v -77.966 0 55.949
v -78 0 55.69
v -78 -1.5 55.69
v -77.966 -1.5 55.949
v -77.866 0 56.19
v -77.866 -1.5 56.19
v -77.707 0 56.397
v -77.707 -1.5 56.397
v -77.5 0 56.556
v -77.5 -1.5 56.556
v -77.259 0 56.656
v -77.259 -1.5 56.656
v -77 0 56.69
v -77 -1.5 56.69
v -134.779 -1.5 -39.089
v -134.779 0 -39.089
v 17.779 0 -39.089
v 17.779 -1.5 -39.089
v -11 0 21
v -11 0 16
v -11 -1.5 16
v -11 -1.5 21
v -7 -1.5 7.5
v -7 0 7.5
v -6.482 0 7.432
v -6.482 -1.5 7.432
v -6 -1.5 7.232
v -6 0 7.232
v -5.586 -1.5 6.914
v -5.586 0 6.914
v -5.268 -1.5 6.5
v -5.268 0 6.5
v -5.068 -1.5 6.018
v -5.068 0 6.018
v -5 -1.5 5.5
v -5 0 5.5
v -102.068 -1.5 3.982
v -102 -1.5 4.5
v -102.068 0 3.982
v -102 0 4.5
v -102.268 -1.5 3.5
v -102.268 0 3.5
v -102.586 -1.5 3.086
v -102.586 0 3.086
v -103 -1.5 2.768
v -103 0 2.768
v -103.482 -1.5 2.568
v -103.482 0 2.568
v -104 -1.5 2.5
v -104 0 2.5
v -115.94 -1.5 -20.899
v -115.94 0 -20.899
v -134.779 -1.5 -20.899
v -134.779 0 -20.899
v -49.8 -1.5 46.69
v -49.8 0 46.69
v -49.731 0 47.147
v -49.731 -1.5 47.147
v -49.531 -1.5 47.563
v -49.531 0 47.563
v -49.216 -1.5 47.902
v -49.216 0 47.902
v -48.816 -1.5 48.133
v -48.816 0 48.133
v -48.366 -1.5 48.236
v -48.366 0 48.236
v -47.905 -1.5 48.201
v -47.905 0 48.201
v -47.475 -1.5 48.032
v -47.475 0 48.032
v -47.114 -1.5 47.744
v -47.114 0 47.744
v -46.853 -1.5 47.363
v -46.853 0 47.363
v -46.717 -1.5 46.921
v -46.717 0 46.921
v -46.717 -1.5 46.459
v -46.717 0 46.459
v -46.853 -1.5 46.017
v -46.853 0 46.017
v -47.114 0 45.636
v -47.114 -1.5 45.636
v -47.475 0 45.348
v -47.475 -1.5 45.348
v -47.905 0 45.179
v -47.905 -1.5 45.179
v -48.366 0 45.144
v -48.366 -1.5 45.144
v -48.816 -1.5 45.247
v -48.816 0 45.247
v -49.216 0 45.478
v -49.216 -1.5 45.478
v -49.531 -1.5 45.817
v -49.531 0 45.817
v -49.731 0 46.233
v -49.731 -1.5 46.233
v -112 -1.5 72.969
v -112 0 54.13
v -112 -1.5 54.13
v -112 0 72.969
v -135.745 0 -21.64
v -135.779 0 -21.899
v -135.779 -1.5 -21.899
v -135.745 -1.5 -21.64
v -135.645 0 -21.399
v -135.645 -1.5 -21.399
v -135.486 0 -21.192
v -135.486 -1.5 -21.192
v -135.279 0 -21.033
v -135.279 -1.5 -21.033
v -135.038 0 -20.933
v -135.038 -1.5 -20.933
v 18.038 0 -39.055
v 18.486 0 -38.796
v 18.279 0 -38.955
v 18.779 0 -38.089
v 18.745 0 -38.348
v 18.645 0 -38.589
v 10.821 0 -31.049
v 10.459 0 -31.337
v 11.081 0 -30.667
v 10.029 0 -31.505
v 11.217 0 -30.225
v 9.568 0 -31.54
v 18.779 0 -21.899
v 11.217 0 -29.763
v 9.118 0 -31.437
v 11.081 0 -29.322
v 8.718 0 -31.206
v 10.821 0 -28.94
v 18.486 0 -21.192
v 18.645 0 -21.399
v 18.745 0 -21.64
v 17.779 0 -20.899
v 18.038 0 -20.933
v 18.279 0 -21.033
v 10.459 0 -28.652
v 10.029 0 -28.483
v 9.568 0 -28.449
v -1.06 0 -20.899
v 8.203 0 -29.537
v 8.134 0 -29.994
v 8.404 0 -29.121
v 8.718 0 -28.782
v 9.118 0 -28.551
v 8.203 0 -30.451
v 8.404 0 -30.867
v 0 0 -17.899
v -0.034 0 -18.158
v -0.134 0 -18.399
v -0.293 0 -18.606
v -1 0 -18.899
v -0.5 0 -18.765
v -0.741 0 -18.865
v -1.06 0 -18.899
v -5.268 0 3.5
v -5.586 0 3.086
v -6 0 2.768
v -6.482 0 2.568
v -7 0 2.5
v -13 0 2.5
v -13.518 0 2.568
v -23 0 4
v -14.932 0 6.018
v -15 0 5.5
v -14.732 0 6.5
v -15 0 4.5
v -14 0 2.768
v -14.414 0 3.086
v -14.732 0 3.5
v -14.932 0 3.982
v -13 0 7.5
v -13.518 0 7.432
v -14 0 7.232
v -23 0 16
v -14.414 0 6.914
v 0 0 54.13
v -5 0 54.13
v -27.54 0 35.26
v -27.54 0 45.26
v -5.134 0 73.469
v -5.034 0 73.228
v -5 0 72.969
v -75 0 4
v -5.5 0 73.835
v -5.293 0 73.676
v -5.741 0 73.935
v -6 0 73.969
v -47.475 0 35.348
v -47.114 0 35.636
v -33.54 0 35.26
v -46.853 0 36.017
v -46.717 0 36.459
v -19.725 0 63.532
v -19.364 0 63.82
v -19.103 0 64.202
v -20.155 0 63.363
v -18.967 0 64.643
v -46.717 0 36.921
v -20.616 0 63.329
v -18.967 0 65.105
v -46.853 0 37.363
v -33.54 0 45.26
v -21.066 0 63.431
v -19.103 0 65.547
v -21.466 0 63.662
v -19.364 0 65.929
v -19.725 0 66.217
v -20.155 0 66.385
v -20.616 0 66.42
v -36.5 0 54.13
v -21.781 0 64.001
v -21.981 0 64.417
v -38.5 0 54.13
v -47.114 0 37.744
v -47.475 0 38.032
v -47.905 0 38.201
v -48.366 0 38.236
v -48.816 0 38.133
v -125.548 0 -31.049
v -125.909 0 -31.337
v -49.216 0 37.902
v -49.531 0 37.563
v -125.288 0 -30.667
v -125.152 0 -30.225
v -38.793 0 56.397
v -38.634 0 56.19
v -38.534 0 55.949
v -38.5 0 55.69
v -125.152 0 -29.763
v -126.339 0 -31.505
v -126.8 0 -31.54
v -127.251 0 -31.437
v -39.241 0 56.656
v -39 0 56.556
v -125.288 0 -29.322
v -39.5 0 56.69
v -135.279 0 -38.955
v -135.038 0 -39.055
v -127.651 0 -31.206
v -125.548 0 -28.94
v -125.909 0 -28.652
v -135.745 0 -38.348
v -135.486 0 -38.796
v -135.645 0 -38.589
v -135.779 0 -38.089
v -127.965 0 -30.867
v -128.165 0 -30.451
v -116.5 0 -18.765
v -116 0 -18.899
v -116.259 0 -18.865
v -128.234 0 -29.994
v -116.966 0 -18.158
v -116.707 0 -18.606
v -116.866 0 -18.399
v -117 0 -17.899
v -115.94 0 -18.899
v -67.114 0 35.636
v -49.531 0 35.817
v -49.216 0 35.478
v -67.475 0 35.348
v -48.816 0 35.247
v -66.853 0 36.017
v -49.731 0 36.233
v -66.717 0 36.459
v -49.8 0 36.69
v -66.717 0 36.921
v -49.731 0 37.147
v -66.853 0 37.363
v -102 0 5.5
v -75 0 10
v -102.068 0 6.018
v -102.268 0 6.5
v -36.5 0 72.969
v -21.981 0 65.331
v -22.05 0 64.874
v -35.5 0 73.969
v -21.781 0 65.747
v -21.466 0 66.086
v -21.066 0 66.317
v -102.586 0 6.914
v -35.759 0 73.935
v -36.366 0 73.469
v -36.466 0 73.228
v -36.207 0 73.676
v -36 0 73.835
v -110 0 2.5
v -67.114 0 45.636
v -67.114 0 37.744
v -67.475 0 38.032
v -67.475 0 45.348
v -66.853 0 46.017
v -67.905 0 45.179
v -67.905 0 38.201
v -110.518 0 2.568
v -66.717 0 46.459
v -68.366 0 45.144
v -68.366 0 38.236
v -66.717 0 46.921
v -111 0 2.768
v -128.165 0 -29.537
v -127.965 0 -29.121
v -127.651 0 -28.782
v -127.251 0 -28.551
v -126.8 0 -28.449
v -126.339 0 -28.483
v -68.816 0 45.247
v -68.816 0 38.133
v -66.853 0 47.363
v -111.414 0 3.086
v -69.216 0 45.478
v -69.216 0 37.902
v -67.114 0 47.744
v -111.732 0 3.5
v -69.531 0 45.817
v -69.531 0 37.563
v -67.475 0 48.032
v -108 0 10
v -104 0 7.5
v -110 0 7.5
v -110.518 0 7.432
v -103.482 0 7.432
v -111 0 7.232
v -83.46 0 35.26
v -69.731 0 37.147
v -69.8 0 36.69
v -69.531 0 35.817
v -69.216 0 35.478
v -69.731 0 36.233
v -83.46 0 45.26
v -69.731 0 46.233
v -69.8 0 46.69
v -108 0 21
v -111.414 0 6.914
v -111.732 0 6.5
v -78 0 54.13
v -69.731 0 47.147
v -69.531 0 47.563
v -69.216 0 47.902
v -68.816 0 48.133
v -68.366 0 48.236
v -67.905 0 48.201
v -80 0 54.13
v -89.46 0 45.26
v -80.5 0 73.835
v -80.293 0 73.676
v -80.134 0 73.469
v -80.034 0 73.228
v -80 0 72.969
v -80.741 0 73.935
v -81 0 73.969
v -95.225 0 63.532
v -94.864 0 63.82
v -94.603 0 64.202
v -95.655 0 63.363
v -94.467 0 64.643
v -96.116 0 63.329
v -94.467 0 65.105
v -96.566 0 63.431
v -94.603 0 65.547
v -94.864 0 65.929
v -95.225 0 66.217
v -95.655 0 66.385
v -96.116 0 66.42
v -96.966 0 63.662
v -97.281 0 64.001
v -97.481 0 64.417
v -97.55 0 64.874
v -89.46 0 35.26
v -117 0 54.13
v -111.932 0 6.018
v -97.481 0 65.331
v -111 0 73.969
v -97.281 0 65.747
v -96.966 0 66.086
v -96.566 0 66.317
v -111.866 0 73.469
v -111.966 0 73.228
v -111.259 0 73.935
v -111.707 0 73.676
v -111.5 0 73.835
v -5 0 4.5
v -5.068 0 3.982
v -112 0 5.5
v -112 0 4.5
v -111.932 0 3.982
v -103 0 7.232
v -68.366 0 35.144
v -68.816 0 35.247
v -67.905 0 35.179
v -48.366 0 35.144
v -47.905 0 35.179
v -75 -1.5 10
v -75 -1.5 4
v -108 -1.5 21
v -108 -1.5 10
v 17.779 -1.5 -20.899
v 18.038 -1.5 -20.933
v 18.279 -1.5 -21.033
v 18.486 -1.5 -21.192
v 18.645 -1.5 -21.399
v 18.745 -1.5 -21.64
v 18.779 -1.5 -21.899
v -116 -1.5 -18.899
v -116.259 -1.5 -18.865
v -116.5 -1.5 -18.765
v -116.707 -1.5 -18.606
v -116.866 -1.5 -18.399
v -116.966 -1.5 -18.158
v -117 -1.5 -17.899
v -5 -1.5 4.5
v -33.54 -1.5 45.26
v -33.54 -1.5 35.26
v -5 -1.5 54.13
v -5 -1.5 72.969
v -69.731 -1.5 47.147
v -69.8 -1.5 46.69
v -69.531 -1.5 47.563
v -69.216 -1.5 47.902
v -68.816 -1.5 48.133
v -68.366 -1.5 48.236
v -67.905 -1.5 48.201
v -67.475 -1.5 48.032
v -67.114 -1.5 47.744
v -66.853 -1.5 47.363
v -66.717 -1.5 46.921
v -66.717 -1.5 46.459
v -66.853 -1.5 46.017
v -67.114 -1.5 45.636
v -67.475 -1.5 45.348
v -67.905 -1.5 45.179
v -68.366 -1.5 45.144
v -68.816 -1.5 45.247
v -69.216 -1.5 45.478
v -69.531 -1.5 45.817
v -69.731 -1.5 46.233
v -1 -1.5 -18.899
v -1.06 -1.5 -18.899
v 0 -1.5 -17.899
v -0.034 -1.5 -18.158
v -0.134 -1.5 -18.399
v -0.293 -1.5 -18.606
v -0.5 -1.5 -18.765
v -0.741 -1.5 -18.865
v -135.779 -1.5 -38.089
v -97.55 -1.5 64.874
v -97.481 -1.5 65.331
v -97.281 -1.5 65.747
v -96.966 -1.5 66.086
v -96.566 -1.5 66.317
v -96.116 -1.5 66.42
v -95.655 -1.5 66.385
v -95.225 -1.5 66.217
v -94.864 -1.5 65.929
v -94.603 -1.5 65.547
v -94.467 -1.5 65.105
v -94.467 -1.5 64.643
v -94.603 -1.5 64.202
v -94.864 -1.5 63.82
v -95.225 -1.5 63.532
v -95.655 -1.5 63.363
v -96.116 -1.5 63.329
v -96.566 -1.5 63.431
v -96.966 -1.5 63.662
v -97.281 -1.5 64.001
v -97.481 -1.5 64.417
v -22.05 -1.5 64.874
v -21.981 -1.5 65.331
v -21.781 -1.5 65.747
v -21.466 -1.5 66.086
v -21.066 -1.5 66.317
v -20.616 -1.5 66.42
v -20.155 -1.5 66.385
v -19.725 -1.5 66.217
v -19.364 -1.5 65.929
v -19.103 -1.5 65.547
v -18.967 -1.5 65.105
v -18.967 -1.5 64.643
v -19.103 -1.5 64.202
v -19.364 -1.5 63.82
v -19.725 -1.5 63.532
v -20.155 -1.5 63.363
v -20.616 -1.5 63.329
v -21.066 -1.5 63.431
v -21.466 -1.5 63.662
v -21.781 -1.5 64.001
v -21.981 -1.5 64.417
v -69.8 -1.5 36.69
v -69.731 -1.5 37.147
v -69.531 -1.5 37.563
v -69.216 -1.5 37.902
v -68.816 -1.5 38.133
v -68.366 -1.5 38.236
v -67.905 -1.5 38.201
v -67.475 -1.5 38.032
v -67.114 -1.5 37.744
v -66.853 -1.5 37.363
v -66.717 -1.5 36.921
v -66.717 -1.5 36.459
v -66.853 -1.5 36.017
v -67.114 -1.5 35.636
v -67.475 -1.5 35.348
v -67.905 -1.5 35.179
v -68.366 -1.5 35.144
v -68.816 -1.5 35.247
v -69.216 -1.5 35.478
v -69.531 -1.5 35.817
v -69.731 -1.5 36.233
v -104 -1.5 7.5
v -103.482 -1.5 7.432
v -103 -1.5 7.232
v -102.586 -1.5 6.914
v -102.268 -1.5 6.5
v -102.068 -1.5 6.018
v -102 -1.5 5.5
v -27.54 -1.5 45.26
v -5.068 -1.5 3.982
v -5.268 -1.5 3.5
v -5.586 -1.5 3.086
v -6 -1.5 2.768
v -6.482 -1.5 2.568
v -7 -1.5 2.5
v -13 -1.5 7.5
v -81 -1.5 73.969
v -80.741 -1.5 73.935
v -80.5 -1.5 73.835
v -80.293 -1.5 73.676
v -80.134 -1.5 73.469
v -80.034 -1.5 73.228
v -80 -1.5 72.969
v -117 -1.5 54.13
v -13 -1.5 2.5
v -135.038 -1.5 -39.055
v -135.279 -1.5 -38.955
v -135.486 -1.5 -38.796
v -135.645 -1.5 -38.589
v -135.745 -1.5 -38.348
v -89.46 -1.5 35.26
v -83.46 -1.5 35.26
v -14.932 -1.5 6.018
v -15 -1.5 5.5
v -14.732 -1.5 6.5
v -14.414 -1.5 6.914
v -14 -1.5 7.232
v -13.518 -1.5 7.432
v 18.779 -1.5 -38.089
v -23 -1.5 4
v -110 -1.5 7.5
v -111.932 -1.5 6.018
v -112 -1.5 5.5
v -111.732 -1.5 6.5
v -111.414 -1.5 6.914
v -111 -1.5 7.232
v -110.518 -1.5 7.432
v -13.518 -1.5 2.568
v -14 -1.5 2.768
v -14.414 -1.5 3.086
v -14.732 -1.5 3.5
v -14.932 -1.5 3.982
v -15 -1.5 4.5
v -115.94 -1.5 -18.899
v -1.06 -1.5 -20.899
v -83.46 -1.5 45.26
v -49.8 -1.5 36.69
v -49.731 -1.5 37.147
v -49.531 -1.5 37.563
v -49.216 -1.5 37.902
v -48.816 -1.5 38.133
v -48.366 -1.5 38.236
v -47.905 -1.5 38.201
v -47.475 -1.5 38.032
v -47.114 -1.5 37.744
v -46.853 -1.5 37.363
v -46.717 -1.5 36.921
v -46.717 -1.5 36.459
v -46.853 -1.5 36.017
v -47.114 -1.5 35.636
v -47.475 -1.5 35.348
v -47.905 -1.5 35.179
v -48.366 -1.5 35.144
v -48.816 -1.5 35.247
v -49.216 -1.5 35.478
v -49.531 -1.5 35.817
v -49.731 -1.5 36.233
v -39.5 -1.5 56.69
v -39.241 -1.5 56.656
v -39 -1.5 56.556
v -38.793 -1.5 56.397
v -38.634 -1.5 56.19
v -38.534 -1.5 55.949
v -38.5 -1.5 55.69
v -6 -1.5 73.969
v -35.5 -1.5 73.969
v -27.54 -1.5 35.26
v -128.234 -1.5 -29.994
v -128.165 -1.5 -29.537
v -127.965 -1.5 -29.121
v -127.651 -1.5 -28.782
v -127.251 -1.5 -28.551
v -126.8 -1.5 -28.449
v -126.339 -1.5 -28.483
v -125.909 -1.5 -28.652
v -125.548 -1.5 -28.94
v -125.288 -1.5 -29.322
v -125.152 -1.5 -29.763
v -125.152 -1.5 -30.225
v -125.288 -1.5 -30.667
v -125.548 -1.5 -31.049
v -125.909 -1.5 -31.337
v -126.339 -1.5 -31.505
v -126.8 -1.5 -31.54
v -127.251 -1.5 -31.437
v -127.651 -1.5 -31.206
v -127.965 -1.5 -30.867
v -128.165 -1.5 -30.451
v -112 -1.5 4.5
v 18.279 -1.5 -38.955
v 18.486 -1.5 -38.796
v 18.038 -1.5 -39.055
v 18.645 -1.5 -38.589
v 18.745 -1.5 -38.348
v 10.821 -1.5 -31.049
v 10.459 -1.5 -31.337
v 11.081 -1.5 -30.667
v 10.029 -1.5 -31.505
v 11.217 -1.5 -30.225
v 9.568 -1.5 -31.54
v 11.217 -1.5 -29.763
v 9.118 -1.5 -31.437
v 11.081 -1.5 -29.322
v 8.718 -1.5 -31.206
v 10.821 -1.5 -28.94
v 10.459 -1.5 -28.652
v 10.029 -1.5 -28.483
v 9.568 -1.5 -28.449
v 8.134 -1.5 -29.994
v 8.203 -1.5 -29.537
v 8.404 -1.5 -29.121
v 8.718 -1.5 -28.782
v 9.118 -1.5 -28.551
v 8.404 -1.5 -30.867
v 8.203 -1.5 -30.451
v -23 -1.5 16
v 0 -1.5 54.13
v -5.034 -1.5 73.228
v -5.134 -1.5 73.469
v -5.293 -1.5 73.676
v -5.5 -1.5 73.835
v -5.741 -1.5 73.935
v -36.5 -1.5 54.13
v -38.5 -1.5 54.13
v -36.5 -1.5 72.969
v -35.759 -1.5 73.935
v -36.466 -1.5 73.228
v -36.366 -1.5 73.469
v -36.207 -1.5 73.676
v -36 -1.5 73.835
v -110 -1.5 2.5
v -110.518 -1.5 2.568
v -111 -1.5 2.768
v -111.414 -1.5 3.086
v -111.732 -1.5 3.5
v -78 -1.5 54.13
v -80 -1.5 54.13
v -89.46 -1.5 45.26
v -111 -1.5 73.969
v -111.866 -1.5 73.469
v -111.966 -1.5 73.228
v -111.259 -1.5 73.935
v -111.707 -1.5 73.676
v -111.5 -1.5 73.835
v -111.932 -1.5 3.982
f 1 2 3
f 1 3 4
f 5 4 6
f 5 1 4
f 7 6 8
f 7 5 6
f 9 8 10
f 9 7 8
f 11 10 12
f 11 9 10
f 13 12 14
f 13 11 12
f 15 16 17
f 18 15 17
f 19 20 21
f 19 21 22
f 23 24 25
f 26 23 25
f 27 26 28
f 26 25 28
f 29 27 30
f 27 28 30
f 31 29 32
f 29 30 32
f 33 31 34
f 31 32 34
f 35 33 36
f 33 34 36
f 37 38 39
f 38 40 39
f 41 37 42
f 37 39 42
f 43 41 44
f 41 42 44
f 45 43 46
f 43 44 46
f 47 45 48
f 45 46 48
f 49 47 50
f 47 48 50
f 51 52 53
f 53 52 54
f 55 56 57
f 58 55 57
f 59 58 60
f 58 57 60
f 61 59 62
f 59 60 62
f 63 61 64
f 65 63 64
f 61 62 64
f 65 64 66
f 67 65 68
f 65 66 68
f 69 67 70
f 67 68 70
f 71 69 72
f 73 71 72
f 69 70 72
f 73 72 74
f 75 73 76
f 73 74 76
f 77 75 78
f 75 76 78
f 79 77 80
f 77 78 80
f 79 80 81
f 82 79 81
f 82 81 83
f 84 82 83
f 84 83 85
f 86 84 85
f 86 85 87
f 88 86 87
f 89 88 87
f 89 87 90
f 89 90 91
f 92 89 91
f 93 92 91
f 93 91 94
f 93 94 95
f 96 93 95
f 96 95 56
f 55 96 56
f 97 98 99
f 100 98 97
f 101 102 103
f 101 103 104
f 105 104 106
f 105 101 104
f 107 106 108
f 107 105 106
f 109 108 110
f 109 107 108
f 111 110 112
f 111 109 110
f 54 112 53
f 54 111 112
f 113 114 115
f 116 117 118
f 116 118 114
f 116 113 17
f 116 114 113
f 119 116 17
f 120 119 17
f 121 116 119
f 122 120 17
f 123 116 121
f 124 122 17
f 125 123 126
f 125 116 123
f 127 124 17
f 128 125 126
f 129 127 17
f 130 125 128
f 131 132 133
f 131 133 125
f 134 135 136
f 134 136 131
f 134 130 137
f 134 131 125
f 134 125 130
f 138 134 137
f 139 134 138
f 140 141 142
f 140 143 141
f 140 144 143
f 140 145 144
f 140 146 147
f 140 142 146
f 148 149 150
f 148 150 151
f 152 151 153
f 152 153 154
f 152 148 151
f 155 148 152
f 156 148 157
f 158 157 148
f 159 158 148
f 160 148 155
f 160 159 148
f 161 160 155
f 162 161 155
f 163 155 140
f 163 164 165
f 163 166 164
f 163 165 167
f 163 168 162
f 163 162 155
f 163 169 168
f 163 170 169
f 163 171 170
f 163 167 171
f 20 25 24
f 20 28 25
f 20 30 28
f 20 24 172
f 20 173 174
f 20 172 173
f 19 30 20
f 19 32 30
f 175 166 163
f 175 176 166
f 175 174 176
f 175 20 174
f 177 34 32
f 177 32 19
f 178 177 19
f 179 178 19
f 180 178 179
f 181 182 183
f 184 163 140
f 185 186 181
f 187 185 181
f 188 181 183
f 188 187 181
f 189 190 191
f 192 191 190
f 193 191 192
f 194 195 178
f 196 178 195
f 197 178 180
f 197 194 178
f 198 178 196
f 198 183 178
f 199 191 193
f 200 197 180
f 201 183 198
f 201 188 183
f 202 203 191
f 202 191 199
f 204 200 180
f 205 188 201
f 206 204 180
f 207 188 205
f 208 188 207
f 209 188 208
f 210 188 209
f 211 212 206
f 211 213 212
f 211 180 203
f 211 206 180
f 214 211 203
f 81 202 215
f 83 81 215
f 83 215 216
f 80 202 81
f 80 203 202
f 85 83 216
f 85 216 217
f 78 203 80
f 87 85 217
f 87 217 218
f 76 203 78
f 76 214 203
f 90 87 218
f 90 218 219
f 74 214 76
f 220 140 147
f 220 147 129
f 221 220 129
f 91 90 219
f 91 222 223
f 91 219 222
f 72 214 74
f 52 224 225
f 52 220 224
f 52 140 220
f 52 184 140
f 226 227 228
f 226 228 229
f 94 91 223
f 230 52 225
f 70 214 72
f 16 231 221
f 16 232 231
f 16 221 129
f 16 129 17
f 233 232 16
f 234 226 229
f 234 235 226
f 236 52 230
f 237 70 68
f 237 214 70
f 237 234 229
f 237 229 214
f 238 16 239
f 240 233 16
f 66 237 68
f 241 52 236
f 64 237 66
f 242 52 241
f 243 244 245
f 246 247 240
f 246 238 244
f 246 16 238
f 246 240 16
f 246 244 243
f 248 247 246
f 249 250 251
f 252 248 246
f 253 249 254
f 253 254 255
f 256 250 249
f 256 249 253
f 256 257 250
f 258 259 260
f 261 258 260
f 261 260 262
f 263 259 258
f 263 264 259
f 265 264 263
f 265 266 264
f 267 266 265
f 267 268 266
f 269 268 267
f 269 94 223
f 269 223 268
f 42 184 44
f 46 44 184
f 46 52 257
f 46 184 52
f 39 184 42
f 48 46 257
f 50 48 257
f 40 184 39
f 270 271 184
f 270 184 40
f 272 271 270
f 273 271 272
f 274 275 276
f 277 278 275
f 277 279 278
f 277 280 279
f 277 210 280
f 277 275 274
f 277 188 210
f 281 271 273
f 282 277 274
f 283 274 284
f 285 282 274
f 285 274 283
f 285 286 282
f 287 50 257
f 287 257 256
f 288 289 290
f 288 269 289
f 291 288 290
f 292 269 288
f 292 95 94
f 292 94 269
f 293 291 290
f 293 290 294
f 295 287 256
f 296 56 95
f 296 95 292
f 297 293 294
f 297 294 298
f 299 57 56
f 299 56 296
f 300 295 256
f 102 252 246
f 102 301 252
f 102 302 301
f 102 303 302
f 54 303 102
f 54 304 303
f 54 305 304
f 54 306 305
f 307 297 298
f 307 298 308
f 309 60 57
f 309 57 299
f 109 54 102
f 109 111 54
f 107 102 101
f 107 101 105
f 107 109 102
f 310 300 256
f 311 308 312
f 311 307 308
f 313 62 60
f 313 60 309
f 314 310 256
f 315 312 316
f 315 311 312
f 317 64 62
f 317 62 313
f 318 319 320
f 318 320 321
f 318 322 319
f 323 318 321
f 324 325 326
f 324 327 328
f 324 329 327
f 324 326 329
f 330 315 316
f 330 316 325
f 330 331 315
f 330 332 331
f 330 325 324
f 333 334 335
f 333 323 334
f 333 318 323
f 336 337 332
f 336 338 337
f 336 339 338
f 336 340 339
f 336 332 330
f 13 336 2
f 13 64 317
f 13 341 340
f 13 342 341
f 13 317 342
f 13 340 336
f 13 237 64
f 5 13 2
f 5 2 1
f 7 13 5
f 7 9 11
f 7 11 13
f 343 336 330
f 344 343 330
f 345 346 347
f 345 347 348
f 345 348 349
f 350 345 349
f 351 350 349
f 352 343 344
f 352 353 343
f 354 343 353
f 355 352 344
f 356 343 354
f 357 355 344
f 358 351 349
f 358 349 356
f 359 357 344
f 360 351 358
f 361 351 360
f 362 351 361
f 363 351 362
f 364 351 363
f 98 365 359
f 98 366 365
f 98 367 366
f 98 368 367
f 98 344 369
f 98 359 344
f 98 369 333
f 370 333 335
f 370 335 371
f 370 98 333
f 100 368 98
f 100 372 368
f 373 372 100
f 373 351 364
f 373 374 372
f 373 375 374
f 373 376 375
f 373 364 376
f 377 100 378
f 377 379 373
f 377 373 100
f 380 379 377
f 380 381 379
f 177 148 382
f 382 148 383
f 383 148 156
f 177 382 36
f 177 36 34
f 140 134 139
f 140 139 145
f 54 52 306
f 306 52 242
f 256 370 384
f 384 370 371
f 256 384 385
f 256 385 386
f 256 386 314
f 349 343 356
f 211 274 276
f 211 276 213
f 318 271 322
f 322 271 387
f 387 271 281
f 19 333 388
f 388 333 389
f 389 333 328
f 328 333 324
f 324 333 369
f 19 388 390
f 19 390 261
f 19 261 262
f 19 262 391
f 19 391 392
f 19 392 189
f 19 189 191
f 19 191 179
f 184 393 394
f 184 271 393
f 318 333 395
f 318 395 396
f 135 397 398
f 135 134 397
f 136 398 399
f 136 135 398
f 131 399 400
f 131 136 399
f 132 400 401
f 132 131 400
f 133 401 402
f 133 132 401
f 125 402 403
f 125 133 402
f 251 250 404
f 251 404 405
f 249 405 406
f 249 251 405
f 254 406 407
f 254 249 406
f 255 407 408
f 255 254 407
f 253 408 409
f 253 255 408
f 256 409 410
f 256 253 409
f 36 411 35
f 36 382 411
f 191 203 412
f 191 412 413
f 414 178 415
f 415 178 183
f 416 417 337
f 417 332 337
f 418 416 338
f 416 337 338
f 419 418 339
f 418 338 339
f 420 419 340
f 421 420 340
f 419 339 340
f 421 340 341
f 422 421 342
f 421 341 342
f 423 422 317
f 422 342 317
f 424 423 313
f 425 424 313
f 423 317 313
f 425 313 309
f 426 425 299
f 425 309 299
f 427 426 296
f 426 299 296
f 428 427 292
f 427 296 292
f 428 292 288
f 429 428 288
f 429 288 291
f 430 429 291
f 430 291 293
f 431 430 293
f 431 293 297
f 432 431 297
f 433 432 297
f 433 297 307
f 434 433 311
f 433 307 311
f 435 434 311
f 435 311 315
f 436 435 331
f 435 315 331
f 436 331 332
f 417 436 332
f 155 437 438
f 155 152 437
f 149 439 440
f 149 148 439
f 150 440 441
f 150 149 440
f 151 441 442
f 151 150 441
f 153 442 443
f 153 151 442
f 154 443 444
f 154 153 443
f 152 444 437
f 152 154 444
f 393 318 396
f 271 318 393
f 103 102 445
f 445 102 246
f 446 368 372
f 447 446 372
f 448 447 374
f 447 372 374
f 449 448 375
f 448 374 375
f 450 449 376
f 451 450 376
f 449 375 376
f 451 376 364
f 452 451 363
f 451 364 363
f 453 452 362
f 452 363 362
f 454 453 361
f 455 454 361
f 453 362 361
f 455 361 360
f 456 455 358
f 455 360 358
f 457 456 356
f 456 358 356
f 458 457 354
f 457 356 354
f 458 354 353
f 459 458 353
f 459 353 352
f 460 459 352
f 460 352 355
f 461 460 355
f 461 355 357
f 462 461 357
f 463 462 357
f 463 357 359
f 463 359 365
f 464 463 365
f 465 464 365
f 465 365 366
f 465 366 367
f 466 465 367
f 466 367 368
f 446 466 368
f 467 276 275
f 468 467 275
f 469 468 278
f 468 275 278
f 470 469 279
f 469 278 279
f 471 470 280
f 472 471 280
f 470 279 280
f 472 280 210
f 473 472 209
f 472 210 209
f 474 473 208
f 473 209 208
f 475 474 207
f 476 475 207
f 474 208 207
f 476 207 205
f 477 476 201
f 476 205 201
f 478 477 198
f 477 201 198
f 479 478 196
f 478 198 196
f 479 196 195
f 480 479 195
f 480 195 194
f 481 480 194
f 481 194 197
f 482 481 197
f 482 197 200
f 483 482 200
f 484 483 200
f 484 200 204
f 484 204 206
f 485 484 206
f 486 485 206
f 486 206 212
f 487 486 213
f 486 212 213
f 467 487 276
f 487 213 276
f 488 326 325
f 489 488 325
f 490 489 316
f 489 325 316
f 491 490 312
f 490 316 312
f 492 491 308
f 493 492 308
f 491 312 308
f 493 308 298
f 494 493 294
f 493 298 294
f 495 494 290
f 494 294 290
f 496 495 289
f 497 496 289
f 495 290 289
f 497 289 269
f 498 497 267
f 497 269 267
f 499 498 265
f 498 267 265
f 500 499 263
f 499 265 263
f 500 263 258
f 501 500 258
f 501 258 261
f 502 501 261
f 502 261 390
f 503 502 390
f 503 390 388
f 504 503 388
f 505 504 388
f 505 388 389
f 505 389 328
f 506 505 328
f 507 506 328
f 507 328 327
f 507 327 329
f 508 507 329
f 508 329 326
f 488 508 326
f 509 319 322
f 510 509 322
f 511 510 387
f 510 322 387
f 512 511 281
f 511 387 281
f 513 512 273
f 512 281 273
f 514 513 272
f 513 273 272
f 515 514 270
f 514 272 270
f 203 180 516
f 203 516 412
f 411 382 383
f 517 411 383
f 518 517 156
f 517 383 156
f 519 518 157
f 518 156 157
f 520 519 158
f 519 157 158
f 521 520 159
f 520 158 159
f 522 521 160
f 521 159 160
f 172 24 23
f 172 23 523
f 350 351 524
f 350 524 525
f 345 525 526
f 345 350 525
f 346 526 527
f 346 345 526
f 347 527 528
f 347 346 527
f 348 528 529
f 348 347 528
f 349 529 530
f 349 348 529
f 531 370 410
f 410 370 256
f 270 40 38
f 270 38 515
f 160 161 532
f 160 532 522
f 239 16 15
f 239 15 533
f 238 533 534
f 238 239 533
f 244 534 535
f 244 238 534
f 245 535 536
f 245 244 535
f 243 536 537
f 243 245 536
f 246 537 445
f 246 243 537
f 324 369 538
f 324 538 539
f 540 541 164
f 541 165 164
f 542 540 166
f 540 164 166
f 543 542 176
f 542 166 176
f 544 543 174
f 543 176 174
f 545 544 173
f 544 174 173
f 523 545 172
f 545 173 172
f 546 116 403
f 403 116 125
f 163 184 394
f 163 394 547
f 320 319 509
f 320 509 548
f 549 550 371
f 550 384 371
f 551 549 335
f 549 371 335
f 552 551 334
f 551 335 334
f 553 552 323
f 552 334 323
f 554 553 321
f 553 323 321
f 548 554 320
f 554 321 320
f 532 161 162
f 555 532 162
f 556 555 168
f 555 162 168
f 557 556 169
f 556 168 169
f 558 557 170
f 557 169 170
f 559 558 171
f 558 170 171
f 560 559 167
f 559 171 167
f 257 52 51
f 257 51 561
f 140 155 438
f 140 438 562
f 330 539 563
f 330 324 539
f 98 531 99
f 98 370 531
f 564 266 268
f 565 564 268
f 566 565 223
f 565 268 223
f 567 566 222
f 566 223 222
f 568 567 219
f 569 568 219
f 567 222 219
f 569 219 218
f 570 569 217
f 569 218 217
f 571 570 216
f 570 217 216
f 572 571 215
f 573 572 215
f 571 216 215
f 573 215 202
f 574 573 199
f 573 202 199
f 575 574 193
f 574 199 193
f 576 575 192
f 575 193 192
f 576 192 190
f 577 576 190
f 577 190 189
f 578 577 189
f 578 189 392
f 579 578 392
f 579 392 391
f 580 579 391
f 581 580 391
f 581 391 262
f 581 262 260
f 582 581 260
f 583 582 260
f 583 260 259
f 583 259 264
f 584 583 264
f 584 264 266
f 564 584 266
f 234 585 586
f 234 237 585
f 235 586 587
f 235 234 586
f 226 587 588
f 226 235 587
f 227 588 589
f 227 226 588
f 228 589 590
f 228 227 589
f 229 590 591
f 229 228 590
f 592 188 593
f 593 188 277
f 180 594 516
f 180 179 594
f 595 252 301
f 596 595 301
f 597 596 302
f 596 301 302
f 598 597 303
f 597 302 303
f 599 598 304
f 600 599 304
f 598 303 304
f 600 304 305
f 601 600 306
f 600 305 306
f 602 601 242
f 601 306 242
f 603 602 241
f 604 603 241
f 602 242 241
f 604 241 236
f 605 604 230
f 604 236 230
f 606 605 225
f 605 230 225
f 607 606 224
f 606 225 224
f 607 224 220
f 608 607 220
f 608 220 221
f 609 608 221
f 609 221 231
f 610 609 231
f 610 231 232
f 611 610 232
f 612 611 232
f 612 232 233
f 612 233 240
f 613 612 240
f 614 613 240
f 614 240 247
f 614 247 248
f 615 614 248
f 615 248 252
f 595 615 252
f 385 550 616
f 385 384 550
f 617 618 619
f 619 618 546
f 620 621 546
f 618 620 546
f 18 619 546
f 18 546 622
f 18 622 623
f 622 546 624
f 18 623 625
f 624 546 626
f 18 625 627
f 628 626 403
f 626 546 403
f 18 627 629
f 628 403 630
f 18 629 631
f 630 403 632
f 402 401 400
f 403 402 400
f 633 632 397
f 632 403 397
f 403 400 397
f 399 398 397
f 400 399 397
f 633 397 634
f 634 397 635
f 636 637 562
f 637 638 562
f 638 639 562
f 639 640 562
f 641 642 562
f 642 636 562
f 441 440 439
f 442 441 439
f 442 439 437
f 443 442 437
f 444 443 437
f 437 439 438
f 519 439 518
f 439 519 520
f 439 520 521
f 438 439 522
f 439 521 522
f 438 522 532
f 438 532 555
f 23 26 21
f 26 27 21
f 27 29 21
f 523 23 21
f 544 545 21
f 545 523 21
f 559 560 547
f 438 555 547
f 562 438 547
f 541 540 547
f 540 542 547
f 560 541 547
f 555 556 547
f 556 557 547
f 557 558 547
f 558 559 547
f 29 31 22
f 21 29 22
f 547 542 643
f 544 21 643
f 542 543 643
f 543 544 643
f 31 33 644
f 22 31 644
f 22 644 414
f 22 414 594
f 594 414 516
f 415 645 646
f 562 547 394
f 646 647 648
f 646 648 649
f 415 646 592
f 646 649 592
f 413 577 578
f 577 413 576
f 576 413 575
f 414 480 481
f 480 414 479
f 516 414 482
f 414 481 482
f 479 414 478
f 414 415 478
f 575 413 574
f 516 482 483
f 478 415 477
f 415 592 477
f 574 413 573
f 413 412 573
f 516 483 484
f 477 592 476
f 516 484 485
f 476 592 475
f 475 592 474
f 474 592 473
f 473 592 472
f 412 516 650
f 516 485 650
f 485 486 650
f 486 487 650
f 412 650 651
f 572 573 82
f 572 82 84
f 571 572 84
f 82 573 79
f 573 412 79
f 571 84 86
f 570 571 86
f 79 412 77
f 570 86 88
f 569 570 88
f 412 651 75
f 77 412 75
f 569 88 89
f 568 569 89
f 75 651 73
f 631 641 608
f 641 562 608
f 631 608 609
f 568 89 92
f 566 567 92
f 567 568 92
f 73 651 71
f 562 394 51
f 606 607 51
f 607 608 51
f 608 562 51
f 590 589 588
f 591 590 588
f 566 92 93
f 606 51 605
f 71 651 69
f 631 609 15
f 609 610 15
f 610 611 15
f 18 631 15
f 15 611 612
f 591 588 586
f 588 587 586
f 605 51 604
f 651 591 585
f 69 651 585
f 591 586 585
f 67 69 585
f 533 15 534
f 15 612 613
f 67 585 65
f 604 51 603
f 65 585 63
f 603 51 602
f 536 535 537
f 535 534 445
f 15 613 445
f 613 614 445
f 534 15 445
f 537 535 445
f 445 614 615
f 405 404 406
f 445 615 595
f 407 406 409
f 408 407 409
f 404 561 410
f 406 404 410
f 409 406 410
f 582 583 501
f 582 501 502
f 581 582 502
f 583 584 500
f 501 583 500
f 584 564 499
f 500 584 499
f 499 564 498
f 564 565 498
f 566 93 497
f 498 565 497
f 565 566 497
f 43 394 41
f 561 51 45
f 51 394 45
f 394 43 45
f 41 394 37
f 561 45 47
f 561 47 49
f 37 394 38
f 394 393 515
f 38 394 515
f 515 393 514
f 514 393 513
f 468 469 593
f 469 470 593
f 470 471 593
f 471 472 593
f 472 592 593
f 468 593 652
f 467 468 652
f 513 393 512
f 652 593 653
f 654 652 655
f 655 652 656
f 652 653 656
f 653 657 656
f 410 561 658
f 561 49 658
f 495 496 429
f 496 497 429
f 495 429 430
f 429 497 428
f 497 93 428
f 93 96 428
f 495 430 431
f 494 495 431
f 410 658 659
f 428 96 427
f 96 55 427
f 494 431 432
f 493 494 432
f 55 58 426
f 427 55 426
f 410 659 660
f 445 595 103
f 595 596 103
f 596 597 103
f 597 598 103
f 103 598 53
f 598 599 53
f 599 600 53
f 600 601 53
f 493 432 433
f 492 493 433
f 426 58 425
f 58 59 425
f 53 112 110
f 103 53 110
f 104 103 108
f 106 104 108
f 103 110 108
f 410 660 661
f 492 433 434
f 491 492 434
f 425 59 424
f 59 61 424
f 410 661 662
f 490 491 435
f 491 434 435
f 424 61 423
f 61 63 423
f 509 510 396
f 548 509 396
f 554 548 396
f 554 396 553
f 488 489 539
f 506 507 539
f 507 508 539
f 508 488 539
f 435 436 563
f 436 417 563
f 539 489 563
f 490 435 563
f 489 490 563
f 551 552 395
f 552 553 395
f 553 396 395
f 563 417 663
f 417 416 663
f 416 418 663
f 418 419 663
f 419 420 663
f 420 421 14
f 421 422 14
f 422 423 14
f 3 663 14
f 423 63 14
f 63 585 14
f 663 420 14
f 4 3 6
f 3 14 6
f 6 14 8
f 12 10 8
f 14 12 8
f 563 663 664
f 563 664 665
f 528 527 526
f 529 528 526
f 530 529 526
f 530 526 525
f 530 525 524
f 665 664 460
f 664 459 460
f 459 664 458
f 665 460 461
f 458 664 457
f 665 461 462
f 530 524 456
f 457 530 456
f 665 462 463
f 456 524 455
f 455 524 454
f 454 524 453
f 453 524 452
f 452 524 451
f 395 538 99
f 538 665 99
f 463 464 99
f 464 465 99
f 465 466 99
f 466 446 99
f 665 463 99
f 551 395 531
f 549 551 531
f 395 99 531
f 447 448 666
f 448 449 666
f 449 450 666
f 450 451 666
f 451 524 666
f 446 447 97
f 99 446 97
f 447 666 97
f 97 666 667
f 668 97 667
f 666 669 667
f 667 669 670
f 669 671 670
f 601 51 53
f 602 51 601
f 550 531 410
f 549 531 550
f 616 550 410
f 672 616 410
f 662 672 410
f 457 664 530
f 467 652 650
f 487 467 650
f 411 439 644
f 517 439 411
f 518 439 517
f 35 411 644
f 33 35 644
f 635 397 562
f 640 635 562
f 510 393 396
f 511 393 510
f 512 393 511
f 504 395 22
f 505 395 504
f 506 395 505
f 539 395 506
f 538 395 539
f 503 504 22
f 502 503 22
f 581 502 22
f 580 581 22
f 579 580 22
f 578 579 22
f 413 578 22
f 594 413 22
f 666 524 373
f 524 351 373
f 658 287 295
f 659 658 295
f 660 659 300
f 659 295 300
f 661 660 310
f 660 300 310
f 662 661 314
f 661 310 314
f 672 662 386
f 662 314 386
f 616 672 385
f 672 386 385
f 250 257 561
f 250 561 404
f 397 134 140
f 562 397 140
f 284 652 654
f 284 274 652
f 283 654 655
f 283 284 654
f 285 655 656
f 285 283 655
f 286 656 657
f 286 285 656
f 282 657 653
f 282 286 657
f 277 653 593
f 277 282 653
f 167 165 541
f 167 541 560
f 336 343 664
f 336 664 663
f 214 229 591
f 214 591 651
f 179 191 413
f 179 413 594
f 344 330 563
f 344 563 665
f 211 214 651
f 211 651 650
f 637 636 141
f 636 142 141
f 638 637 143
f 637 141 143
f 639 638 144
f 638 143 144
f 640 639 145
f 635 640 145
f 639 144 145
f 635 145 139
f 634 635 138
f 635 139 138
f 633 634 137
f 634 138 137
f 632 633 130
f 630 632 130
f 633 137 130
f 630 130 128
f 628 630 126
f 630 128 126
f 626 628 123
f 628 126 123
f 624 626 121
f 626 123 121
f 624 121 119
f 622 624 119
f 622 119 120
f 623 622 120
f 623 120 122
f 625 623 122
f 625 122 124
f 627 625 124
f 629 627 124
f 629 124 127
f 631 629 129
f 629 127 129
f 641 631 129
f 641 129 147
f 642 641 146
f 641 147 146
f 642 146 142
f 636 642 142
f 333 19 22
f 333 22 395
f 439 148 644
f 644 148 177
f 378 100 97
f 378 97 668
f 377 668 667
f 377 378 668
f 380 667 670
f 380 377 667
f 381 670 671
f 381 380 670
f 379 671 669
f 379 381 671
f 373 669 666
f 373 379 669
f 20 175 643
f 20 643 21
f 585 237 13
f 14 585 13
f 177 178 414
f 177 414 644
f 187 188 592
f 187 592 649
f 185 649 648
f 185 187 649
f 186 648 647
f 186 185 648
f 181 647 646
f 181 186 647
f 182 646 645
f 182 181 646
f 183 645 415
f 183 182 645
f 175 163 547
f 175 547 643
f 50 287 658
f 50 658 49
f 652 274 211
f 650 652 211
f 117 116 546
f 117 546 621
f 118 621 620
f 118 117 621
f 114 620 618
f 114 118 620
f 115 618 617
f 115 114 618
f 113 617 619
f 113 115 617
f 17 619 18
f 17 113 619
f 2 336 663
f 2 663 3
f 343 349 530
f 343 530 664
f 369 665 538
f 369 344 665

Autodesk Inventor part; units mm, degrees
ref_plane "YZ Plane" through (0, 0, 0) normal (1, 0, 0) x (0, 1, 0)
ref_plane "XZ Plane" through (0, 0, 0) normal (0, 1, 0) x (-1, 0, 0)
ref_plane "XY Plane" through (0, 0, 0) normal (0, 0, 1) x (1, 0, 0)
sketch "Sketch1" plane through (0, 0, 0) normal (0, 1, 0) x (-1, 0, 0)
  line L0 (112, 55.3296) -> (80, 55.3296)
  line L1 (117.1396, -39.0893) -> (117.1396, -20.8993)
  line L2 (117, -0.4496) -> (0, -0.4496)
  line L3 (36.5, 55.3296) -> (5, 55.3296)
  line L4 (-0.1396, -20.8993) -> (-0.1396, -39.0893)
  circle A0 centre (48.25, 46.69) radius 1.55
  circle A1 centre (48.25, 36.69) radius 1.55
  circle A2 centre (68.25, 46.69) radius 1.55
  circle A3 centre (68.25, 36.69) radius 1.55
  line L5 (83.46, 35.26) -> (83.46, 45.26)
  line L6 (89.46, 35.26) -> (83.46, 35.26)
  line L7 (89.46, 45.26) -> (89.46, 35.26)
  line L8 (83.46, 45.26) -> (89.46, 45.26)
  line L9 (33.54, 45.26) -> (33.54, 35.26)
  line L10 (27.54, 45.26) -> (33.54, 45.26)
  line L11 (27.54, 35.26) -> (27.54, 45.26)
  line L12 (33.54, 35.26) -> (27.54, 35.26)
  line L13 (108, 21) -> (108, 10)
  line L14 (11, 21) -> (108, 21)
  line L15 (11, 16) -> (11, 21)
  line L16 (23, 16) -> (11, 16)
  line L17 (23, 4) -> (23, 16)
  line L18 (75, 4) -> (23, 4)
  line L19 (75, 10) -> (75, 4)
  line L20 (108, 10) -> (75, 10)
  arc A4 (112, 5.5) -> (110, 7.5) centre (110, 5.5) ccw
  line L21 (104, 7.5) -> (110, 7.5)
  arc A5 (110, 2.5) -> (112, 4.5) centre (110, 4.5) ccw
  line L22 (110, 2.5) -> (104, 2.5)
  arc A6 (102, 4.5) -> (104, 2.5) centre (104, 4.5) ccw
  line L23 (102, 4.5) -> (102, 5.5)
  arc A7 (104, 7.5) -> (102, 5.5) centre (104, 5.5) ccw
  arc A8 (15, 5.5) -> (13, 7.5) centre (13, 5.5) ccw
  line L24 (7, 7.5) -> (13, 7.5)
  arc A9 (13, 2.5) -> (15, 4.5) centre (13, 4.5) ccw
  line L25 (13, 2.5) -> (7, 2.5)
  arc A10 (5, 4.5) -> (7, 2.5) centre (7, 4.5) ccw
  line L26 (5, 4.5) -> (5, 5.5)
  arc A11 (7, 7.5) -> (5, 5.5) centre (7, 5.5) ccw
  line L27 (112, 5.5) -> (112, 4.5)
  line L28 (15, 5.5) -> (15, 4.5)
  circle A12 centre (20.5, 64.8743) radius 1.55
  circle A13 centre (96, 64.8743) radius 1.55
  circle A14 centre (-9.6843, -29.9943) radius 1.55
  circle A15 centre (126.6843, -29.9943) radius 1.55
  arc A16 (0, -17.8993) -> (1, -18.8993) centre (1, -17.8993) ccw
  arc A17 (116, -18.8993) -> (117, -17.8993) centre (116, -17.8993) ccw
  line L29 (115.94, -18.8993) -> (116, -18.8993)
  arc A18 (135.7793, -21.8993) -> (134.7793, -20.8993) centre (134.7793, -21.8993) ccw
  arc A19 (134.7793, -39.0893) -> (135.7793, -38.0893) centre (134.7793, -38.0893) ccw
  line L30 (134.7793, -39.0893) -> (-17.7793, -39.0893)
  arc A20 (-18.7793, -38.0893) -> (-17.7793, -39.0893) centre (-17.7793, -38.0893) ccw
  arc A21 (-17.7793, -20.8993) -> (-18.7793, -21.8993) centre (-17.7793, -21.8993) ccw
  line L31 (-17.7793, -20.8993) -> (1.06, -20.8993)
  arc A22 (39.5, 56.69) -> (38.5, 55.69) centre (39.5, 55.69) ccw
  line L32 (39.5, 56.69) -> (77, 56.69)
  arc A23 (78, 55.69) -> (77, 56.69) centre (77, 55.69) ccw
  arc A24 (81, 73.9693) -> (80, 72.9693) centre (81, 72.9693) ccw
  arc A25 (112, 72.9693) -> (111, 73.9693) centre (111, 72.9693) ccw
  arc A26 (6, 73.9693) -> (5, 72.9693) centre (6, 72.9693) ccw
  arc A27 (36.5, 72.9693) -> (35.5, 73.9693) centre (35.5, 72.9693) ccw
  line L33 (36.5, 72.9693) -> (36.5, 54.13)
  line L34 (6, 73.9693) -> (35.5, 73.9693)
  line L35 (38.5, 55.69) -> (38.5, 54.13)
  line L36 (38.5, 54.13) -> (36.5, 54.13)
  line L37 (5, 54.13) -> (5, 72.9693)
  line L38 (5, 54.13) -> (0, 54.13)
  line L39 (0, -17.8993) -> (0, 54.13)
  line L40 (81, 73.9693) -> (111, 73.9693)
  line L41 (112, 54.13) -> (112, 72.9693)
  line L42 (117, 54.13) -> (112, 54.13)
  line L43 (78, 54.13) -> (78, 55.69)
  line L44 (80, 72.9693) -> (80, 54.13)
  line L45 (80, 54.13) -> (78, 54.13)
  line L46 (117, 54.13) -> (117, -17.8993)
  line L47 (-18.7793, -38.0893) -> (-18.7793, -21.8993)
  line L48 (135.7793, -21.8993) -> (135.7793, -38.0893)
  line L49 (115.94, -20.8993) -> (134.7793, -20.8993)
  line L50 (115.94, -20.8993) -> (115.94, -18.8993)
  line L51 (1, -18.8993) -> (1.06, -18.8993)
  line L52 (1.06, -18.8993) -> (1.06, -20.8993)
  line L53 (-0.5893, -39.0893) -> (-0.5893, -20.8993)
  line L54 (117.5893, -20.8993) -> (117.5893, -39.0893)
  line L55 (0.31, -20.8993) -> (0.31, -39.0893)
  line L56 (116.69, -39.0893) -> (116.69, -20.8993)
  line L57 (5, 55.7793) -> (36.5, 55.7793)
  line L58 (117, -0.8993) -> (0, -0.8993)
  line L59 (80, 55.7793) -> (112, 55.7793)
  line L60 (36.5, 54.88) -> (5, 54.88)
  line L61 (0, 0) -> (117, 0)
  line L62 (112, 54.88) -> (80, 54.88)
extrude "Extrusion1" add sketch "Sketch1" against normal blind 1.5
properties part number "body_top_frame"
